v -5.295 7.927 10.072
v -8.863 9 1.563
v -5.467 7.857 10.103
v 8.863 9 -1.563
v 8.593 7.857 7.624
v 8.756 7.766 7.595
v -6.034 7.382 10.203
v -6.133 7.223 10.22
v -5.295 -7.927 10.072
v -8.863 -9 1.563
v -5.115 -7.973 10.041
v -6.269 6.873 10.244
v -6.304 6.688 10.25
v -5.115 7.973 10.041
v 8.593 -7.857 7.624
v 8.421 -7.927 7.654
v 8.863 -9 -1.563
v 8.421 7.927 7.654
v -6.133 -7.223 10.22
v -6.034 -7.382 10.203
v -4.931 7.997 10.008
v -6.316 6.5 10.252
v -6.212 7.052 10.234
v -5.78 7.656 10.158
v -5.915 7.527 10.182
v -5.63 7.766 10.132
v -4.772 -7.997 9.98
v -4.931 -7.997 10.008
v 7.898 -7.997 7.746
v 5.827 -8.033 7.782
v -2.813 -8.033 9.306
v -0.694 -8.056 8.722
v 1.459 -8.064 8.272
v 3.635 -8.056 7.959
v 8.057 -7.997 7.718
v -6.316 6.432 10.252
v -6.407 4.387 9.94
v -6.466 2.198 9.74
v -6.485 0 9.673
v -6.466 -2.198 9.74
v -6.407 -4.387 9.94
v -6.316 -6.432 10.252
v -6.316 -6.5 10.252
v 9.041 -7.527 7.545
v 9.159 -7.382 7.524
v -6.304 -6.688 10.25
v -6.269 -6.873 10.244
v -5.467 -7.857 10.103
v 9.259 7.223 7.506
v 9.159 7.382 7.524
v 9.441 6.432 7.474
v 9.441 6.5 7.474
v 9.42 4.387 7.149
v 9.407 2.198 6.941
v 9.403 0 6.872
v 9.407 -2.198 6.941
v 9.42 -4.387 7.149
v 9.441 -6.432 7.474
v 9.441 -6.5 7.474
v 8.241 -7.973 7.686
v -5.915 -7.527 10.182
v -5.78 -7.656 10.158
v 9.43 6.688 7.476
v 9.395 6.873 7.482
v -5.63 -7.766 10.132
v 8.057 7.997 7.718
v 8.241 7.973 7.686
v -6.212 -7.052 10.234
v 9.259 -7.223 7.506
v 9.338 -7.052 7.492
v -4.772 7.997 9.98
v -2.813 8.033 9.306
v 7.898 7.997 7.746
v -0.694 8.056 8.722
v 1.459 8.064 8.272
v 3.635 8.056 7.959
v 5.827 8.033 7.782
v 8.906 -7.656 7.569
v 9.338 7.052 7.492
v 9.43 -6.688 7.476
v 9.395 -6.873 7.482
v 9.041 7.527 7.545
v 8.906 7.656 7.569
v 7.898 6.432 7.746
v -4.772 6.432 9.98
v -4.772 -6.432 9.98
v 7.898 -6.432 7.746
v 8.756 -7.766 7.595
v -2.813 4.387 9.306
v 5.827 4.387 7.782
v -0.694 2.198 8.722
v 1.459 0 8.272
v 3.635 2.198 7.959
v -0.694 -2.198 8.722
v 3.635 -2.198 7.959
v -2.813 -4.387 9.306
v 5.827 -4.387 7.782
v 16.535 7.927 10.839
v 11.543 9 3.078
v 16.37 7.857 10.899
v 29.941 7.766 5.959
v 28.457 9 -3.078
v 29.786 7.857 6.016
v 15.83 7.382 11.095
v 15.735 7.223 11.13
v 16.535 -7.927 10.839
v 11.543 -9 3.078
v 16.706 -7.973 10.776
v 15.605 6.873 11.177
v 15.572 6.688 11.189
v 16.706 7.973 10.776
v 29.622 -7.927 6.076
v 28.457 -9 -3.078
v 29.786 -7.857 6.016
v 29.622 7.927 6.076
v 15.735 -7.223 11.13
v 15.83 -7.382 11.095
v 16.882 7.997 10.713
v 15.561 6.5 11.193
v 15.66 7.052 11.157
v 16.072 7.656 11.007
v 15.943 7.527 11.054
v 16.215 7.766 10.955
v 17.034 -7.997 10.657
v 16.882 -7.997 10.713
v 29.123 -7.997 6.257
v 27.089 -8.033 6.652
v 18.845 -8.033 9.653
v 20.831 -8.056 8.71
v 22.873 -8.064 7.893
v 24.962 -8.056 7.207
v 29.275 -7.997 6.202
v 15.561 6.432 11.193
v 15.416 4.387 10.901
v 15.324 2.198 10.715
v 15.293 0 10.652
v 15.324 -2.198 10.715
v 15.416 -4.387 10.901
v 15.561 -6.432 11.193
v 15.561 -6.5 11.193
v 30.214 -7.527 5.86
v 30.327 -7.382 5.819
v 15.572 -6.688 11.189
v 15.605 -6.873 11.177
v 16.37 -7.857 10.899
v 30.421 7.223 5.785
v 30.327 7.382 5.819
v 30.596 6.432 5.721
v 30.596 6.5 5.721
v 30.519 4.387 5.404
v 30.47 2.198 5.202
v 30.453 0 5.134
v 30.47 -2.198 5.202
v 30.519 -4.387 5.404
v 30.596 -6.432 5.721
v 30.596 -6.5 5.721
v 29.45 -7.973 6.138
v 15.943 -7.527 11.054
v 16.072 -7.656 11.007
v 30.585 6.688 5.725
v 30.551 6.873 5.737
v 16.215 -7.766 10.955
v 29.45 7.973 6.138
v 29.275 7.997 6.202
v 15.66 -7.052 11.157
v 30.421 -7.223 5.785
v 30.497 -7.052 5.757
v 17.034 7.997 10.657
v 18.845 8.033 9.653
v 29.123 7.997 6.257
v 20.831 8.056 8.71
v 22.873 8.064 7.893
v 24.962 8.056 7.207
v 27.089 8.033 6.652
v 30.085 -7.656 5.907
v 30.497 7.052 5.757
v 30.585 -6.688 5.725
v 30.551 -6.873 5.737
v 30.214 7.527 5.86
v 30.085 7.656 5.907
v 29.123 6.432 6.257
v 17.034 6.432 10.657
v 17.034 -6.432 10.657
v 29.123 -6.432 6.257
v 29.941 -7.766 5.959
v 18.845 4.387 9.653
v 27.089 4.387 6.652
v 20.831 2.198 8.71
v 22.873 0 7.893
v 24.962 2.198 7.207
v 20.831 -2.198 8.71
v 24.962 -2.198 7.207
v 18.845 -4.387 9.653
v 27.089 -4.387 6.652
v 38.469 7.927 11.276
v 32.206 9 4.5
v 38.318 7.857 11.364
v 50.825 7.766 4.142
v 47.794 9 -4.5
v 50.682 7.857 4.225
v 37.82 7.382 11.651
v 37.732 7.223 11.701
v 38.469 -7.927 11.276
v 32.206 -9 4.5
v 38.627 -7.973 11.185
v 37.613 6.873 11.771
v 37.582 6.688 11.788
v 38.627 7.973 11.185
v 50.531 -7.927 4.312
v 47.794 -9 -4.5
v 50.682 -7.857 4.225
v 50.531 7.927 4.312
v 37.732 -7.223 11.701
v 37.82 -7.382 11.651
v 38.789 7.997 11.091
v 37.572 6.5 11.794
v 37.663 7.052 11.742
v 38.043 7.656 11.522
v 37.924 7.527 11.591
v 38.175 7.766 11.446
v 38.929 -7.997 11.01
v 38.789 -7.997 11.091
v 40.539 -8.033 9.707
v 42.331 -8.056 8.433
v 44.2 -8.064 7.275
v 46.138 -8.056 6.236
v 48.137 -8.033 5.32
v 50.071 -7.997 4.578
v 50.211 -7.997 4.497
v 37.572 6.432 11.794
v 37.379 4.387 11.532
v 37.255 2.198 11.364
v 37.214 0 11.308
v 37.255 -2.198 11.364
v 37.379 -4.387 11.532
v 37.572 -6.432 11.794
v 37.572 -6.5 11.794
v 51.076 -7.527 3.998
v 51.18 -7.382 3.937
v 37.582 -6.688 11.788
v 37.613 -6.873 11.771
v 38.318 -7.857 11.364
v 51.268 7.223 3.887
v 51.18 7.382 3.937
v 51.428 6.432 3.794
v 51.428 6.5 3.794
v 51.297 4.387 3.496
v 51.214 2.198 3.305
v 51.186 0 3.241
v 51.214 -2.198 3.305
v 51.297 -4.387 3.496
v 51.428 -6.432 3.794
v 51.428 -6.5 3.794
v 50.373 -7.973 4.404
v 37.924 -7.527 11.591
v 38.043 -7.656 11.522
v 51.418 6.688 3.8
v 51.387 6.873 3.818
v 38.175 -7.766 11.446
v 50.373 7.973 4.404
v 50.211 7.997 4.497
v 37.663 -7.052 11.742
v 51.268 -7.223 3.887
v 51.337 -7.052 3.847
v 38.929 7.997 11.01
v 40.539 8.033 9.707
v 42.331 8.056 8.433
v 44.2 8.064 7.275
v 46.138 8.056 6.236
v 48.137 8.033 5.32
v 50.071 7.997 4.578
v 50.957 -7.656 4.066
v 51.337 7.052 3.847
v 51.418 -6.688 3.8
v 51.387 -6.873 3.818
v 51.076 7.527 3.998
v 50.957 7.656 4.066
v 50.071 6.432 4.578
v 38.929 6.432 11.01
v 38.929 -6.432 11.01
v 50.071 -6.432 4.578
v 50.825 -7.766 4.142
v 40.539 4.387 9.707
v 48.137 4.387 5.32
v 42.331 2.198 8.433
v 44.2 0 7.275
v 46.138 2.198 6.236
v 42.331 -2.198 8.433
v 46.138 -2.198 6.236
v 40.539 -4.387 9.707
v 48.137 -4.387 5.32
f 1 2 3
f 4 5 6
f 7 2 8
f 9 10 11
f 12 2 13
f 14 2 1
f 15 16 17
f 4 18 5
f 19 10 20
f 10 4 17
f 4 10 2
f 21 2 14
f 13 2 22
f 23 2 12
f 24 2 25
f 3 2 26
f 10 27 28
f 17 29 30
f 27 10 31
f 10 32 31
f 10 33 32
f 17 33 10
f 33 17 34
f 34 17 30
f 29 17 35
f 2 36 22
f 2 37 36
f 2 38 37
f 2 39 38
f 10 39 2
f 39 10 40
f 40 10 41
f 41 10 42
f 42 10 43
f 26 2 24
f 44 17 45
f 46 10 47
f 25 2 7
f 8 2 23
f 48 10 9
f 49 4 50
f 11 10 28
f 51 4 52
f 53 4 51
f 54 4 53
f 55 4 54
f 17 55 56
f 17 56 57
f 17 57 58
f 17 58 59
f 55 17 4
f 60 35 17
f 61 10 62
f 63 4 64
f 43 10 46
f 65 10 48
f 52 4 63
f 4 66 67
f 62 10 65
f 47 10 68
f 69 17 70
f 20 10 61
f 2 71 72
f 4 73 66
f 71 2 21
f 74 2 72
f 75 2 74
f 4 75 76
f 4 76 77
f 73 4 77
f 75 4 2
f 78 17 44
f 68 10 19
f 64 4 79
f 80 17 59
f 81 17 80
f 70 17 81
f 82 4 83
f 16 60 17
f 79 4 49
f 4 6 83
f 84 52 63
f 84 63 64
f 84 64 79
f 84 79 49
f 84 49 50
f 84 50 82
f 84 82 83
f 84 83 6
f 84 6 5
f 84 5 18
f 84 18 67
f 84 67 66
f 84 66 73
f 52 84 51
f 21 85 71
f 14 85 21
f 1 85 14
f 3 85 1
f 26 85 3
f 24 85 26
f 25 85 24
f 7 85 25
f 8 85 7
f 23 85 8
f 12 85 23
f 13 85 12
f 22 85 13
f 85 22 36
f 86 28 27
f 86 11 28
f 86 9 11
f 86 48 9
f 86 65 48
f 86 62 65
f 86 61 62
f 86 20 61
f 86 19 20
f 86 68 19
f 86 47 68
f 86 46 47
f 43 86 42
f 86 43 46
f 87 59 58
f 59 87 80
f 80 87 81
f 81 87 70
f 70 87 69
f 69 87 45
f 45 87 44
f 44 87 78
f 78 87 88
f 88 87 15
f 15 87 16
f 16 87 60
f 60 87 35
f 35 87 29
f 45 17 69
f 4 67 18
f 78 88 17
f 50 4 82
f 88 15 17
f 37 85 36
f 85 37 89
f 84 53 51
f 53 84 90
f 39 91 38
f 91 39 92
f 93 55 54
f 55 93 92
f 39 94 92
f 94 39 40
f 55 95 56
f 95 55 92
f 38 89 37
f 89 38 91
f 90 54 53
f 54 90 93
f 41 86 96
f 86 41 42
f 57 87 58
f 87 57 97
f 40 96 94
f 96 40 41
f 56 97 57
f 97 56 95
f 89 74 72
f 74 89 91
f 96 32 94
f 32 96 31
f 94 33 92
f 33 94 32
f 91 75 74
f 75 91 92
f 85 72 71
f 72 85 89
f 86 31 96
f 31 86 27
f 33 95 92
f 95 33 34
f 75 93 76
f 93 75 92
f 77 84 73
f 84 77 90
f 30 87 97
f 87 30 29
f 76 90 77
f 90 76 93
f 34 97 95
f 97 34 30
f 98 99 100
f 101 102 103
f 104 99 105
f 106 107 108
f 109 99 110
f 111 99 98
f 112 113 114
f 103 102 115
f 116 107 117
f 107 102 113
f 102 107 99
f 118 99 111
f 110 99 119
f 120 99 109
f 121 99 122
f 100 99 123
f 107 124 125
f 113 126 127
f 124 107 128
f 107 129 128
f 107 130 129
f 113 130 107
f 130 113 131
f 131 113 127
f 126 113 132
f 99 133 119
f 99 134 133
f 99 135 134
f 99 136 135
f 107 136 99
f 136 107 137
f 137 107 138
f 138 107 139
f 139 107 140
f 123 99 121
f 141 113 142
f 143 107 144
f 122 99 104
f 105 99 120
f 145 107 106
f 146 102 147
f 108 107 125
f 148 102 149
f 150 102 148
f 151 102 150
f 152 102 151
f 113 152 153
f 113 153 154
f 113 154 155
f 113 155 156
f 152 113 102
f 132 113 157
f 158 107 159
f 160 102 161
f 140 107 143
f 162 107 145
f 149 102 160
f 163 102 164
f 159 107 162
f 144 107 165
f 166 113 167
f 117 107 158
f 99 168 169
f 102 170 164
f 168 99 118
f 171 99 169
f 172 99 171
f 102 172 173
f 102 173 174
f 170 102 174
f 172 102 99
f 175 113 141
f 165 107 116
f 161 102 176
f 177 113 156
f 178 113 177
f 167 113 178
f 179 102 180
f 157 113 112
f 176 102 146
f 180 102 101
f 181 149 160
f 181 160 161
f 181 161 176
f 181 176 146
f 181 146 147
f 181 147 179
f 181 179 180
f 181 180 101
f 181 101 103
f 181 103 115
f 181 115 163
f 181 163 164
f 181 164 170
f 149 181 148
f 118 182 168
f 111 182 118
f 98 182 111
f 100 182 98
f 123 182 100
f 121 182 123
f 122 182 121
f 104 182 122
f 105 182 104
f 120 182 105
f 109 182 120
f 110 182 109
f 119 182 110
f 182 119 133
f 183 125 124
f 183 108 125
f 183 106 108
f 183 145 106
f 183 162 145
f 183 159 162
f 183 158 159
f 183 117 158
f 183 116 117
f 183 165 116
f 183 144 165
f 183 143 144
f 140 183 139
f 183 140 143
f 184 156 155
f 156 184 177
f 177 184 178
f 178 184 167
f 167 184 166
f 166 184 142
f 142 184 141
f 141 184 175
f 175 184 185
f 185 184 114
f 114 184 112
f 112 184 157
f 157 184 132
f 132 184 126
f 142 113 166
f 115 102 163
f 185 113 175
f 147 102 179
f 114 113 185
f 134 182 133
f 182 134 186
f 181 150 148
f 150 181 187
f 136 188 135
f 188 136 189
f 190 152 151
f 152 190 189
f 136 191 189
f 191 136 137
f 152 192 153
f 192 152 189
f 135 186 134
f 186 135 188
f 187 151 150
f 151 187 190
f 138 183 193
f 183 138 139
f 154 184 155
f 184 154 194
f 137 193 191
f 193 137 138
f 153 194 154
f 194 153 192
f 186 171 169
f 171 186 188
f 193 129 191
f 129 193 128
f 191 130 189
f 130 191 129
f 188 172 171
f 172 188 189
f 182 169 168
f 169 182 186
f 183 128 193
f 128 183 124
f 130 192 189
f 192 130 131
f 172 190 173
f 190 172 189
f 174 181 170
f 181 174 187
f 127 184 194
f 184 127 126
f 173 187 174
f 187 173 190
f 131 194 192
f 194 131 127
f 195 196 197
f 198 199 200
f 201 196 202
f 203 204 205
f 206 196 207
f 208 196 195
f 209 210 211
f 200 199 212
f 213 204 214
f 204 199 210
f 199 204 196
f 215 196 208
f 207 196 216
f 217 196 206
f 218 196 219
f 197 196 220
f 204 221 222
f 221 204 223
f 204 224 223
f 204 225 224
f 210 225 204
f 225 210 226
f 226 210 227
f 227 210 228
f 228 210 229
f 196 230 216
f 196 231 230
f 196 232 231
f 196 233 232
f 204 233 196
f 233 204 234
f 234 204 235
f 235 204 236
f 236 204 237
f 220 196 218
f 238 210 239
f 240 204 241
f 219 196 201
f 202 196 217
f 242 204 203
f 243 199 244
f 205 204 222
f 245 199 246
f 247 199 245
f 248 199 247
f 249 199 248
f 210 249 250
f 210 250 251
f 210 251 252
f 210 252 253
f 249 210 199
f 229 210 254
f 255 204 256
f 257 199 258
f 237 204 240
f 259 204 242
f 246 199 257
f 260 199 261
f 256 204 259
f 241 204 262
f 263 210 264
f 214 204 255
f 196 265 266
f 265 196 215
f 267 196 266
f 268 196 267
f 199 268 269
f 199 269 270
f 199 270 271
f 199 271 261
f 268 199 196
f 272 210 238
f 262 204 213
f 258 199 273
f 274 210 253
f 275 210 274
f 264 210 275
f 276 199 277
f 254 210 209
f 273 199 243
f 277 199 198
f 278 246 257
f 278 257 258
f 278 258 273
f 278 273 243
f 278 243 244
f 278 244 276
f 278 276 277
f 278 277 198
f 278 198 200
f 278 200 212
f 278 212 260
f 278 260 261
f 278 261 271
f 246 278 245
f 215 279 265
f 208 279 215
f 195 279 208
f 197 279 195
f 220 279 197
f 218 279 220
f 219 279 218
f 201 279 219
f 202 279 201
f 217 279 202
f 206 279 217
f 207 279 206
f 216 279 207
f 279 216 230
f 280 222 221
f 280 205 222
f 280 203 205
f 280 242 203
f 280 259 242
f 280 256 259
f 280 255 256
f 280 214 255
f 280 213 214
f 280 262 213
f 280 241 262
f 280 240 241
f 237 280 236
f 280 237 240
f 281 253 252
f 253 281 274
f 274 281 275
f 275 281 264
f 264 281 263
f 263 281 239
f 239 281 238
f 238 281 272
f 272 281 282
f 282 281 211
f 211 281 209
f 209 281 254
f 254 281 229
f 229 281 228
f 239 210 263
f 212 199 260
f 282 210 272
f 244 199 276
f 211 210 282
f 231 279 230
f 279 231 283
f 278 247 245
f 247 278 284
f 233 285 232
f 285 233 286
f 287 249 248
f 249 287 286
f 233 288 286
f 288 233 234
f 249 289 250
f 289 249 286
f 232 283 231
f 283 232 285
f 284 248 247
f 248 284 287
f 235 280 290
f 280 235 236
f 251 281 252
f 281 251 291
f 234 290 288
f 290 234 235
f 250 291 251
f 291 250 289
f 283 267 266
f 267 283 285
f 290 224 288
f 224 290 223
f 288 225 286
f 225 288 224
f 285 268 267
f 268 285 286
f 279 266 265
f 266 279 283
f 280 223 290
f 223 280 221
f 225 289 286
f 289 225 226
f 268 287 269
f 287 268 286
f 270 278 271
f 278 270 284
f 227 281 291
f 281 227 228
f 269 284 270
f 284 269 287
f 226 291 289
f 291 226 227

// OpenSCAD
// file: xda.scad
SWITCH_HEIGHT = 9;
CYLINDRICAL_RADIUS = 35;
CYLINDRICAL_DEPTH = 0.6;
SWITCH_BOTTOM_WIDTH = 18;
SWITCH_TOP_WIDTH = 14.5;
SWITCH_CORNER_RADIUS = 1.5;

module SwitchCutout()
{
	translate([-10, 0, CYLINDRICAL_RADIUS + SWITCH_HEIGHT - CYLINDRICAL_DEPTH])
	rotate([0,90,0])
	cylinder(r=CYLINDRICAL_RADIUS, h=20, $fn=100);
}

module Switch()
{

	difference()
	{	
		hull()
		{
			cube([SWITCH_BOTTOM_WIDTH,SWITCH_BOTTOM_WIDTH,0.00001], center=true);

			height = 0.01;
			$fn=50;	
			translate([0,0,SWITCH_HEIGHT-height / 2])
			{
				minkowski()
				{
					cube([SWITCH_TOP_WIDTH-SWITCH_CORNER_RADIUS, SWITCH_TOP_WIDTH-SWITCH_CORNER_RADIUS, height], center=true);
					translate([0, 0, -height])
					cylinder(r=SWITCH_CORNER_RADIUS, h=height);
				}
			}
		}
		SwitchCutout();
		rotate([0, 0, 90])
		SwitchCutout();
	}
}

Switch();
// main file
use <xda.scad>


module KeyRow(switches)
{
	for(switch = switches)
	{
		pos = [switch[0], 0, switch[1]];
		rotation = [0, switch[2], 0];
		translate(pos)
		rotate(rotation)
		Switch();
	}
}

KeyRow([[0, 0, 10], [20, 0, 20], [40, 0, 30]]);
